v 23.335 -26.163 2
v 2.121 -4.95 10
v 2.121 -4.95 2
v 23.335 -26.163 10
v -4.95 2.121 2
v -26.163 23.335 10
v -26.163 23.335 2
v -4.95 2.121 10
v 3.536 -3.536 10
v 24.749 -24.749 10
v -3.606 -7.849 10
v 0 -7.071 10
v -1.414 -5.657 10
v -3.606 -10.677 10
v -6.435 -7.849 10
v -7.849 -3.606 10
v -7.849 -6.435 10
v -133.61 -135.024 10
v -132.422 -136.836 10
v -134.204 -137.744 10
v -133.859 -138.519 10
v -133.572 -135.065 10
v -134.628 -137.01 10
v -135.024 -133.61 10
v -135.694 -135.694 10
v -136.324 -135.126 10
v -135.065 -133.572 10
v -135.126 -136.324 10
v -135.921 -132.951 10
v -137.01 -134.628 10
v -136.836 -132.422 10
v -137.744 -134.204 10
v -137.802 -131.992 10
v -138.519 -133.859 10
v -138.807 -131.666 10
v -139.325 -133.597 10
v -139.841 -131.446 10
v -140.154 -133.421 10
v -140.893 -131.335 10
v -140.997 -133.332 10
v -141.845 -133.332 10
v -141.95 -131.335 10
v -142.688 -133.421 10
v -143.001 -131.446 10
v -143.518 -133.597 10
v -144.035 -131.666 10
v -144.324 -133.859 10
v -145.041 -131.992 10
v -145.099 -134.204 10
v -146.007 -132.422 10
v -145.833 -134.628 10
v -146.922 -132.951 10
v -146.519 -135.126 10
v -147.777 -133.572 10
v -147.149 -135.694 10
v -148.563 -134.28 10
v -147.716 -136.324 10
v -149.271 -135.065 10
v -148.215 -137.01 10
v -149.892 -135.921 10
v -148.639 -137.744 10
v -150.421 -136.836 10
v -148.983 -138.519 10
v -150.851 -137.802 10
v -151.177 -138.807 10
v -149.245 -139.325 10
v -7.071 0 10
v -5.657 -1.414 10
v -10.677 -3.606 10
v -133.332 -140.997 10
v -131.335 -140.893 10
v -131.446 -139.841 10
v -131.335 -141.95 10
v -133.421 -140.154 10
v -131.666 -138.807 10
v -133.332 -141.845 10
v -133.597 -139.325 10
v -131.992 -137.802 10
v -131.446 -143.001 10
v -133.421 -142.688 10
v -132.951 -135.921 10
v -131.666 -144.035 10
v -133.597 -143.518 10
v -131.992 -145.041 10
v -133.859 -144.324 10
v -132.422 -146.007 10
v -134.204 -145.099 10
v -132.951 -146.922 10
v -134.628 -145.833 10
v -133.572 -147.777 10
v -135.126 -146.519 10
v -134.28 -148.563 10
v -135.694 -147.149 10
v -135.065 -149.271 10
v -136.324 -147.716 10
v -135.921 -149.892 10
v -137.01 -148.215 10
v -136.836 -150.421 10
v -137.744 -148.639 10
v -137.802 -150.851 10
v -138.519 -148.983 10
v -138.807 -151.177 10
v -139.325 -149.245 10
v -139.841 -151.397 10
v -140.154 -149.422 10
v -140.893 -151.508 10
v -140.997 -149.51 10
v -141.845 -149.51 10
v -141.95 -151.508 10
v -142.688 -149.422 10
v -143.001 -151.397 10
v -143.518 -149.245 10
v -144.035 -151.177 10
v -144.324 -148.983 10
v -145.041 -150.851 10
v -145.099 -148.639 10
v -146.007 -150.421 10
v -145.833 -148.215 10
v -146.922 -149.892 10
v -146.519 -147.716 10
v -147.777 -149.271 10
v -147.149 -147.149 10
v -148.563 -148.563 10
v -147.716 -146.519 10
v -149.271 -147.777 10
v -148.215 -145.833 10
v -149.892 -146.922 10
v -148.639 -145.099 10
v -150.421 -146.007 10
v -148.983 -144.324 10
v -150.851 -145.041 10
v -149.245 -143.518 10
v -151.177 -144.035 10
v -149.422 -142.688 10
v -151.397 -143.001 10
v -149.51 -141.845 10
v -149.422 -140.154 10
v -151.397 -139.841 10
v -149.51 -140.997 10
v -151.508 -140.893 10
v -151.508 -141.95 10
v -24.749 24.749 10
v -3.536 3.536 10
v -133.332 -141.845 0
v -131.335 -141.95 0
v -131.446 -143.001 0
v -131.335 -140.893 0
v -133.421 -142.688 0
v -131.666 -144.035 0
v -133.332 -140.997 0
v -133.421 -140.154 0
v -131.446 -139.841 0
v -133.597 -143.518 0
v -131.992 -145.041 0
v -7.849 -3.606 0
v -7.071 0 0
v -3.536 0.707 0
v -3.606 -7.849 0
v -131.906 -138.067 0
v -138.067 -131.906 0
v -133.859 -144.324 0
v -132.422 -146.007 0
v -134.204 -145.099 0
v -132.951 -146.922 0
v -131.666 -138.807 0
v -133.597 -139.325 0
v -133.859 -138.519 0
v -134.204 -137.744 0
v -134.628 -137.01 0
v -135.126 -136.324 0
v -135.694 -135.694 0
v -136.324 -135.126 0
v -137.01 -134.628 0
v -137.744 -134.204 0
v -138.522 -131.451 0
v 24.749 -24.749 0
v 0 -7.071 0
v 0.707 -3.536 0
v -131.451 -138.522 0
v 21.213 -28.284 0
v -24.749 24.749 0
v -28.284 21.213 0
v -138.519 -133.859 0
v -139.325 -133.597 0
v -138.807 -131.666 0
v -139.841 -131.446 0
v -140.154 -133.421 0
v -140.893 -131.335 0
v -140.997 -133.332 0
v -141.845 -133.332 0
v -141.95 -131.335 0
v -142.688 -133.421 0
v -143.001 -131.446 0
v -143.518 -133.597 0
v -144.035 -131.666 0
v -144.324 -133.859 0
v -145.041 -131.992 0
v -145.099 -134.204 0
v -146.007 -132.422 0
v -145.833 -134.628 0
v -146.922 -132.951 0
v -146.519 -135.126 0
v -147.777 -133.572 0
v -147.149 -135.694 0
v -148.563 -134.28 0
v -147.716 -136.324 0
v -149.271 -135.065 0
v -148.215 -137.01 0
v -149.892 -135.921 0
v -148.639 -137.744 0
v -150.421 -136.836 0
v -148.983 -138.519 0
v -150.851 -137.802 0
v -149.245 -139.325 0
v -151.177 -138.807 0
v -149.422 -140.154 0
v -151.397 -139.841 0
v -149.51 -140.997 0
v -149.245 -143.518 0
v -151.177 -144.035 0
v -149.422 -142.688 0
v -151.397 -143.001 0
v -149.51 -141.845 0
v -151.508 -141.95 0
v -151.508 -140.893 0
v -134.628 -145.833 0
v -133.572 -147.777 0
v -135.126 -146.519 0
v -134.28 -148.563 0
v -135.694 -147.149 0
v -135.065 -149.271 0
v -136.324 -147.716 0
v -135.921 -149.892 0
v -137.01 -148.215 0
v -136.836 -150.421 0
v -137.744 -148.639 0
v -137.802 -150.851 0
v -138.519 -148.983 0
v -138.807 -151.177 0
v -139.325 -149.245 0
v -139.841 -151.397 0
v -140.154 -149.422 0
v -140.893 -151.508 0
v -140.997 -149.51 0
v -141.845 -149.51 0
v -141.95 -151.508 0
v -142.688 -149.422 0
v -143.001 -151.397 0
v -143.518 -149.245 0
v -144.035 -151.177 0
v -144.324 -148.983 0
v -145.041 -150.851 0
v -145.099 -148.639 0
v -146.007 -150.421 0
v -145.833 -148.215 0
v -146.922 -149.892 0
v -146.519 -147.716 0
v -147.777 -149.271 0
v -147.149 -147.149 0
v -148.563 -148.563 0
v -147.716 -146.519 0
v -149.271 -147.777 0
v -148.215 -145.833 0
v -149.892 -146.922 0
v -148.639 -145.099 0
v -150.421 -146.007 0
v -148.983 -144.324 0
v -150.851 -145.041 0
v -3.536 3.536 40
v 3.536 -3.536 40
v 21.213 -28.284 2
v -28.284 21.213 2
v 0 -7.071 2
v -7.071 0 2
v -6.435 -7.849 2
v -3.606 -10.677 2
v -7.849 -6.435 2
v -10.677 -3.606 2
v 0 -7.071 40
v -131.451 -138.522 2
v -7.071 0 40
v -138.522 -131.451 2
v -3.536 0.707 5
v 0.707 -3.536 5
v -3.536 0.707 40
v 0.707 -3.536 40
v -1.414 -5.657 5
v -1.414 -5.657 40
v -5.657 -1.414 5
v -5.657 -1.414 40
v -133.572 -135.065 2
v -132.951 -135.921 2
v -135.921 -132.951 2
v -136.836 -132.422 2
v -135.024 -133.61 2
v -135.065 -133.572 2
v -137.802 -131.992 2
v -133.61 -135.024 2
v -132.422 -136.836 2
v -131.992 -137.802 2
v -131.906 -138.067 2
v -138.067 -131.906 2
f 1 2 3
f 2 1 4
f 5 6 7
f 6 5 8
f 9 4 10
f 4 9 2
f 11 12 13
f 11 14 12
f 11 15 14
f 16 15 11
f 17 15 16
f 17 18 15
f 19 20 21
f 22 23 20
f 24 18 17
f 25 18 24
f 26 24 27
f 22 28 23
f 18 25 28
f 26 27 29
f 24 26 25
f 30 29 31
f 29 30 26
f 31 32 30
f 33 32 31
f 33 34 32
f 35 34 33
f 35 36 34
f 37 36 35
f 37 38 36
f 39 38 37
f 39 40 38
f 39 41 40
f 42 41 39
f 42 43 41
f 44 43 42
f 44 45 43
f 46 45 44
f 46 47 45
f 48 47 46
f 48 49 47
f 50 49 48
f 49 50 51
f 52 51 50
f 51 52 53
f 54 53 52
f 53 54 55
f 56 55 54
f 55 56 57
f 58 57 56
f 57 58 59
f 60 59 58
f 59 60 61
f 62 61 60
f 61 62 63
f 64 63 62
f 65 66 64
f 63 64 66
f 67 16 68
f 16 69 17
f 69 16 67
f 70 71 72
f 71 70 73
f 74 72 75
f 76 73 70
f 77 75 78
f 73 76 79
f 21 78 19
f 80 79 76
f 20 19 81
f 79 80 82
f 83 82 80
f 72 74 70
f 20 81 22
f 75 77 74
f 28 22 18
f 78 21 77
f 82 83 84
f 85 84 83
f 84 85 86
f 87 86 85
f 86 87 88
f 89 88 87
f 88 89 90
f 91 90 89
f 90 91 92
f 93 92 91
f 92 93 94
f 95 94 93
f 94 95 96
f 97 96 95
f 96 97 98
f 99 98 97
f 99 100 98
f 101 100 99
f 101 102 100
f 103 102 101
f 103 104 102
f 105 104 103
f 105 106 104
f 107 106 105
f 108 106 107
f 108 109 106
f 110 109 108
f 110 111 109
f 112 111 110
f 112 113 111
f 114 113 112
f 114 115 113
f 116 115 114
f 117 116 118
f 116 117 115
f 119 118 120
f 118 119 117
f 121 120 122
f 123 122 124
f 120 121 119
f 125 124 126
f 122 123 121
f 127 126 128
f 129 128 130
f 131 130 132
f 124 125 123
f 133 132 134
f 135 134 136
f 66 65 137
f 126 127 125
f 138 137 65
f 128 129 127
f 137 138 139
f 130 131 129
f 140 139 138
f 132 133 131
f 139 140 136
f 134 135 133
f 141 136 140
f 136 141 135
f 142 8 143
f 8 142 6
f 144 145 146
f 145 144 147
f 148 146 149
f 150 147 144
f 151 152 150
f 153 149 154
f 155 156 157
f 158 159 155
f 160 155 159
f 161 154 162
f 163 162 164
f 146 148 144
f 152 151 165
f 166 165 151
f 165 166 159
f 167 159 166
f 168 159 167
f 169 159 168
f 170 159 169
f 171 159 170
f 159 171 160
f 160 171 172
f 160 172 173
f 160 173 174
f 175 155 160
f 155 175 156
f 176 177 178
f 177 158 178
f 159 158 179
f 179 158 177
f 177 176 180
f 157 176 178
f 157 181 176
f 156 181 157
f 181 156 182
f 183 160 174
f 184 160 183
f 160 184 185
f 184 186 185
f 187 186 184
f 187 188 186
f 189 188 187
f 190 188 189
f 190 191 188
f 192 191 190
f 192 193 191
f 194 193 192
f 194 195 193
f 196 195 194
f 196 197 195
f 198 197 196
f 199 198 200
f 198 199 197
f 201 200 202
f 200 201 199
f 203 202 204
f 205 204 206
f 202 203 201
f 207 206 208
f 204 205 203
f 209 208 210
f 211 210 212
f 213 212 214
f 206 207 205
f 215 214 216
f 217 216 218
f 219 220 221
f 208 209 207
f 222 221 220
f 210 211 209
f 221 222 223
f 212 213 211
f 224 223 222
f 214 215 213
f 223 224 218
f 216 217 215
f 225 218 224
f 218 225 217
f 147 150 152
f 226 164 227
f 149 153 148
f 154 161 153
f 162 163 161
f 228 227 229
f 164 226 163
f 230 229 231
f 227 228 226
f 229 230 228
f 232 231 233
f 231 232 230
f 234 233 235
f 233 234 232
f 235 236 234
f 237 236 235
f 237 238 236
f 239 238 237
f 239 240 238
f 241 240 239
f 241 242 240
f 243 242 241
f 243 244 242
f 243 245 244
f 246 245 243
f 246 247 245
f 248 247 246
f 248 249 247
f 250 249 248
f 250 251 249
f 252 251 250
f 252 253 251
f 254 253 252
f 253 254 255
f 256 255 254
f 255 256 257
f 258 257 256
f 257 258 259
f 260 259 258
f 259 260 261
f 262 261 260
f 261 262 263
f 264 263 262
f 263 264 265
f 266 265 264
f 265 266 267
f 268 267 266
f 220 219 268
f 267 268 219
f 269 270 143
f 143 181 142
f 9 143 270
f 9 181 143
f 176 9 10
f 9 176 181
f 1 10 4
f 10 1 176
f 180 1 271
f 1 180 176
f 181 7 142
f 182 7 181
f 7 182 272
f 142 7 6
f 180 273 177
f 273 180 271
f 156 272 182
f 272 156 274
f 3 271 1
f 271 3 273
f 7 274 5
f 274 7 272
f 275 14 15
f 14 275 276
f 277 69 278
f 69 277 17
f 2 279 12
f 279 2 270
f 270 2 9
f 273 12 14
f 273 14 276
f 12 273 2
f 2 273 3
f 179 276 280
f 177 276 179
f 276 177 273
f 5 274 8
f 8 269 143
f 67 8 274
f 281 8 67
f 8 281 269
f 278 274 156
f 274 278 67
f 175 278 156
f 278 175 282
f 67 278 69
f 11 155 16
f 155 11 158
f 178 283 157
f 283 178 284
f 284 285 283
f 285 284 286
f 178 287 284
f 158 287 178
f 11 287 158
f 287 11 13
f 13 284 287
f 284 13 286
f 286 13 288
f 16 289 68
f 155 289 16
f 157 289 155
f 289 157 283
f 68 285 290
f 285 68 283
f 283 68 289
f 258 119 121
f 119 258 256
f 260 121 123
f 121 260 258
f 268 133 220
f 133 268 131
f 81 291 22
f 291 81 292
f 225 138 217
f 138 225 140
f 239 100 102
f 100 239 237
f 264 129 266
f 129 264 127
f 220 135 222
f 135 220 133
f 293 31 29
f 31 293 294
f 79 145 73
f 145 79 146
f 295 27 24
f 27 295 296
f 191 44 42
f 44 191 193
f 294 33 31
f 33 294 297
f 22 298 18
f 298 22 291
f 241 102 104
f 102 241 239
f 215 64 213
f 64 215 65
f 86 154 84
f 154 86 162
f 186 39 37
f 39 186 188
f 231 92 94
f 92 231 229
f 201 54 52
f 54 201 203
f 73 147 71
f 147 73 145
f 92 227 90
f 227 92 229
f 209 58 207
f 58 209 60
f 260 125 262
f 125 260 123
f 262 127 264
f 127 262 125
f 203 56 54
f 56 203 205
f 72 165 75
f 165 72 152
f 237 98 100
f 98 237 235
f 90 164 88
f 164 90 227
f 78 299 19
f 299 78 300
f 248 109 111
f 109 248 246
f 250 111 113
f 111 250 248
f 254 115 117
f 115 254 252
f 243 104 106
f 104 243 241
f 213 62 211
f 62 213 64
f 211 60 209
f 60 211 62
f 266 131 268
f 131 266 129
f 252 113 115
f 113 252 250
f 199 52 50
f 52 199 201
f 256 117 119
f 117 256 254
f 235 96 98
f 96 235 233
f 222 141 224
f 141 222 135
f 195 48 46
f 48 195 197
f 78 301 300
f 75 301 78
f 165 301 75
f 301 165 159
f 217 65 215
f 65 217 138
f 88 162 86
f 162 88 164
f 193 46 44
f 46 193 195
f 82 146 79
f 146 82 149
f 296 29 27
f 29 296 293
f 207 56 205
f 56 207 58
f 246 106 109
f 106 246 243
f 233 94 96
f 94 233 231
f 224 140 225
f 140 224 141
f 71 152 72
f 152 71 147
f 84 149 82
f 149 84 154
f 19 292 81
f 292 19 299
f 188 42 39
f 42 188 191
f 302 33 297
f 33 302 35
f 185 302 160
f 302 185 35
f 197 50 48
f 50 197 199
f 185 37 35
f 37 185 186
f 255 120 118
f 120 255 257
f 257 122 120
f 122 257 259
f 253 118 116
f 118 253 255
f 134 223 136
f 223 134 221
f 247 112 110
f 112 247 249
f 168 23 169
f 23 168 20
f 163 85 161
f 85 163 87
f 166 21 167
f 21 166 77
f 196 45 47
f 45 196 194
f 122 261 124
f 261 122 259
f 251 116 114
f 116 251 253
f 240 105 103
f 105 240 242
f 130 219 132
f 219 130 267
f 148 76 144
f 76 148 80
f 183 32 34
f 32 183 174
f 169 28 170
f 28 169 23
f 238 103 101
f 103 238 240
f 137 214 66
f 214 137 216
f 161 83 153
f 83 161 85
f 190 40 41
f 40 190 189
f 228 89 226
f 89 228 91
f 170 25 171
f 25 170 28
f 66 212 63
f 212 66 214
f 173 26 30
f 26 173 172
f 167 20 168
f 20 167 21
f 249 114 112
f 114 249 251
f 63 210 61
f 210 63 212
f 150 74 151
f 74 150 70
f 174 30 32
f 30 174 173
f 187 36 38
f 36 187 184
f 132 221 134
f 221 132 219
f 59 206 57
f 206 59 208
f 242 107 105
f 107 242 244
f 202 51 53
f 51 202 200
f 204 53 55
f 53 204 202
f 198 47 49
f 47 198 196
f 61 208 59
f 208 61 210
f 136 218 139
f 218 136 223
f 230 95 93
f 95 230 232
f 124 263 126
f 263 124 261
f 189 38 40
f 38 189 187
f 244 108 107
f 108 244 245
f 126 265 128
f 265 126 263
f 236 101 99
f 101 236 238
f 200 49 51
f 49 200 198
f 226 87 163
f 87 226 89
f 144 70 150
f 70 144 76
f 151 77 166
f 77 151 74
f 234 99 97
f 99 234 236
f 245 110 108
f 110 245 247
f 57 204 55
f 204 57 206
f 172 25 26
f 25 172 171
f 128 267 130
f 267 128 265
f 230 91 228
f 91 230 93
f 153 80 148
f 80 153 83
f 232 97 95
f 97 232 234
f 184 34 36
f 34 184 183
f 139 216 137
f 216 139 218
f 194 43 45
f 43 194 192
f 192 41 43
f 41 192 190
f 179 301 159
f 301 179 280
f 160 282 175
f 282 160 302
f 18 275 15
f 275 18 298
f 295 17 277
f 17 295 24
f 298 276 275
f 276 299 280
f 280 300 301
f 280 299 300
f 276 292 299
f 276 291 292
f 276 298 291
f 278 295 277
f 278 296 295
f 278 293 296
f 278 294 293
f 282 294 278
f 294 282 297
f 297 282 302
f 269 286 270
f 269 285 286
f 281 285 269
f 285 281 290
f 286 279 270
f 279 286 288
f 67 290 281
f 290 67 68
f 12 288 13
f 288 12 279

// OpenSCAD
//
// Ultrasound test bench
//
// Design by Egil Kvaleberg, 1 February 2015
//
// Now with some extra strengthening of the tower
//
// Note that X and Z are switched. Sorry about that

variant = "tower"; // [demo, tower, pivot, bar]

// wall thickness
wall = 2.0;
// diameter of transducer
sdia = 16.2; 
// height above table
theight = 200.0; 
// width of bar
bwidth = 10.0;
// length of supporting feet
fwidth = 70.0;
// distance horisontally
dlen = 200.0; 
// tolerance for fit 
tol = 0.25; 
// radius of protractor
protractor = 40.0; 

platform = 1*200.0;
d = 1*0.03;

//color("Green") cube([platform, platform, 0.1], center=true);


module tower() {
	// main pillar
	translate([theight/2, 0, bwidth/2]) cube([theight-sdia-wall, wall, bwidth], center=true);
	translate([theight/2, 0, wall/2]) cube([theight-sdia-wall, bwidth, wall], center=true);

	translate([0, 0, bwidth/2]) difference(){
		union () {
			// feet across
			translate([wall/2, 0, 0]) cube([wall, fwidth, bwidth], center=true);
			translate([bwidth/2/2, 0, -bwidth/2+wall/2]) cube([bwidth/2, fwidth, wall], center=true);
			translate([wall+sdia/4, 0, 0]) cube([sdia/2, bwidth, bwidth], center=true);
		}
		union () {
			translate([wall+(sdia/2-wall)/2, 0, 0]) cube([sdia/2-wall, bwidth-2*wall, 2*d+bwidth], center=true);
		}
	}
	// foot "upwards"
	translate([wall/2, 0, fwidth/4+bwidth/2]) cube([wall, bwidth, fwidth/2], center=true);
	translate([bwidth/2/2, wall/2-bwidth/2, fwidth/4+bwidth/2]) cube([bwidth/2, wall, fwidth/2], center=true);
	translate([bwidth/2/2, bwidth/2-wall/2, fwidth/4+bwidth/2]) cube([bwidth/2, wall, fwidth/2], center=true);
	// ring on top
	translate([theight, 0, 0]) difference () {
		cylinder(r=sdia/2+wall, h=bwidth, $fn=60);
		translate([0, 0, -d]) cylinder(r=sdia/2, h=bwidth+2*d, $fn=60);
	}
}

module connector (len) {
	translate([0, 0, bwidth/2])
			translate([wall+(sdia/2-wall)/2, 0, 0]) cube([sdia/2-wall-2*tol, bwidth-2*wall-2*tol, bwidth+2*tol], center=true);
	translate([bwidth/2, 0, -tol-(bwidth/2)/2]) cube([bwidth, bwidth, bwidth/2], center=true);
	translate([wall/2, 0, -tol-(len-tol)/2]) cube([wall, bwidth, len-tol], center=true);
}


module pivot() {
	connector(1.1*bwidth);
	translate([0, 0, -1.1*bwidth]) rotate([0,90,0]) {
		difference () { 
			intersection () {
				cylinder(r = protractor, h=wall, $fn=60);
				translate([protractor/2, 0, wall/2]) cube([protractor, 2*protractor, wall], center=true);
			}
			for (r = [-90:5:90]) 
			rotate([0, 0, r]) translate([protractor-2.0, 0, -d]) cylinder(r = 1.2, h=wall+2*d, $fn=10);
			for (r = [-90:15:90]) 
			rotate([0, 0, r]) translate([protractor-5.0, 0, -d]) cylinder(r = 1.2, h=wall+2*d, $fn=10);
		}
	}
	translate([0, 0, -1.1*bwidth]) rotate([0,90,0]) cylinder(r = bwidth/4-tol/2, h=3*wall, $fn=20);
}

module bar() {
	difference () {
		union () {
			connector(dlen-protractor-bwidth*1.1-tol);
			translate([wall+tol/2, 0, protractor-dlen+1.6*bwidth+tol]) cube([wall+tol+wall, bwidth, 1.0*bwidth], center=true);
			translate([wall/2+wall+tol, 0, protractor-dlen-0.4*bwidth]) cube([wall, bwidth, protractor+1*bwidth], center=true);
			translate([wall+tol, 0, 1.1*bwidth-dlen]) rotate([0,90,0]) cylinder(r=bwidth/2, h=wall);
		}
		union () {
			// axle
			translate([0, 0, 1.1*bwidth-dlen]) rotate([0,90,0]) cylinder(r = bwidth/4+tol/2, h=2*wall+tol+d, $fn=20);
			// observation hole 
			translate([0, 0, protractor+0.8*bwidth-dlen]) rotate([0,90,0]) cylinder(r = bwidth/4, h=2*wall+tol+d, $fn=20);
			translate([0, 0, protractor+0.4*bwidth-dlen]) rotate([0,90,0]) cylinder(r = 1.2, h=2*wall+tol+d, $fn=20);
		}
	}
}

if (variant == "tower") rotate([0, 0, 180+45]) tower();
if (variant == "bar") rotate([0, -90, 45]) bar();
if (variant == "pivot") rotate([0, -90, 0]) pivot();
if (variant == "demo") rotate([0, -90, 0]) {
	tower();
	color("Green") bar();	 
	rotate([180, 0, 0]) translate([0, 0, dlen]) {
		color("Blue") pivot();
		tower();
	}
}
